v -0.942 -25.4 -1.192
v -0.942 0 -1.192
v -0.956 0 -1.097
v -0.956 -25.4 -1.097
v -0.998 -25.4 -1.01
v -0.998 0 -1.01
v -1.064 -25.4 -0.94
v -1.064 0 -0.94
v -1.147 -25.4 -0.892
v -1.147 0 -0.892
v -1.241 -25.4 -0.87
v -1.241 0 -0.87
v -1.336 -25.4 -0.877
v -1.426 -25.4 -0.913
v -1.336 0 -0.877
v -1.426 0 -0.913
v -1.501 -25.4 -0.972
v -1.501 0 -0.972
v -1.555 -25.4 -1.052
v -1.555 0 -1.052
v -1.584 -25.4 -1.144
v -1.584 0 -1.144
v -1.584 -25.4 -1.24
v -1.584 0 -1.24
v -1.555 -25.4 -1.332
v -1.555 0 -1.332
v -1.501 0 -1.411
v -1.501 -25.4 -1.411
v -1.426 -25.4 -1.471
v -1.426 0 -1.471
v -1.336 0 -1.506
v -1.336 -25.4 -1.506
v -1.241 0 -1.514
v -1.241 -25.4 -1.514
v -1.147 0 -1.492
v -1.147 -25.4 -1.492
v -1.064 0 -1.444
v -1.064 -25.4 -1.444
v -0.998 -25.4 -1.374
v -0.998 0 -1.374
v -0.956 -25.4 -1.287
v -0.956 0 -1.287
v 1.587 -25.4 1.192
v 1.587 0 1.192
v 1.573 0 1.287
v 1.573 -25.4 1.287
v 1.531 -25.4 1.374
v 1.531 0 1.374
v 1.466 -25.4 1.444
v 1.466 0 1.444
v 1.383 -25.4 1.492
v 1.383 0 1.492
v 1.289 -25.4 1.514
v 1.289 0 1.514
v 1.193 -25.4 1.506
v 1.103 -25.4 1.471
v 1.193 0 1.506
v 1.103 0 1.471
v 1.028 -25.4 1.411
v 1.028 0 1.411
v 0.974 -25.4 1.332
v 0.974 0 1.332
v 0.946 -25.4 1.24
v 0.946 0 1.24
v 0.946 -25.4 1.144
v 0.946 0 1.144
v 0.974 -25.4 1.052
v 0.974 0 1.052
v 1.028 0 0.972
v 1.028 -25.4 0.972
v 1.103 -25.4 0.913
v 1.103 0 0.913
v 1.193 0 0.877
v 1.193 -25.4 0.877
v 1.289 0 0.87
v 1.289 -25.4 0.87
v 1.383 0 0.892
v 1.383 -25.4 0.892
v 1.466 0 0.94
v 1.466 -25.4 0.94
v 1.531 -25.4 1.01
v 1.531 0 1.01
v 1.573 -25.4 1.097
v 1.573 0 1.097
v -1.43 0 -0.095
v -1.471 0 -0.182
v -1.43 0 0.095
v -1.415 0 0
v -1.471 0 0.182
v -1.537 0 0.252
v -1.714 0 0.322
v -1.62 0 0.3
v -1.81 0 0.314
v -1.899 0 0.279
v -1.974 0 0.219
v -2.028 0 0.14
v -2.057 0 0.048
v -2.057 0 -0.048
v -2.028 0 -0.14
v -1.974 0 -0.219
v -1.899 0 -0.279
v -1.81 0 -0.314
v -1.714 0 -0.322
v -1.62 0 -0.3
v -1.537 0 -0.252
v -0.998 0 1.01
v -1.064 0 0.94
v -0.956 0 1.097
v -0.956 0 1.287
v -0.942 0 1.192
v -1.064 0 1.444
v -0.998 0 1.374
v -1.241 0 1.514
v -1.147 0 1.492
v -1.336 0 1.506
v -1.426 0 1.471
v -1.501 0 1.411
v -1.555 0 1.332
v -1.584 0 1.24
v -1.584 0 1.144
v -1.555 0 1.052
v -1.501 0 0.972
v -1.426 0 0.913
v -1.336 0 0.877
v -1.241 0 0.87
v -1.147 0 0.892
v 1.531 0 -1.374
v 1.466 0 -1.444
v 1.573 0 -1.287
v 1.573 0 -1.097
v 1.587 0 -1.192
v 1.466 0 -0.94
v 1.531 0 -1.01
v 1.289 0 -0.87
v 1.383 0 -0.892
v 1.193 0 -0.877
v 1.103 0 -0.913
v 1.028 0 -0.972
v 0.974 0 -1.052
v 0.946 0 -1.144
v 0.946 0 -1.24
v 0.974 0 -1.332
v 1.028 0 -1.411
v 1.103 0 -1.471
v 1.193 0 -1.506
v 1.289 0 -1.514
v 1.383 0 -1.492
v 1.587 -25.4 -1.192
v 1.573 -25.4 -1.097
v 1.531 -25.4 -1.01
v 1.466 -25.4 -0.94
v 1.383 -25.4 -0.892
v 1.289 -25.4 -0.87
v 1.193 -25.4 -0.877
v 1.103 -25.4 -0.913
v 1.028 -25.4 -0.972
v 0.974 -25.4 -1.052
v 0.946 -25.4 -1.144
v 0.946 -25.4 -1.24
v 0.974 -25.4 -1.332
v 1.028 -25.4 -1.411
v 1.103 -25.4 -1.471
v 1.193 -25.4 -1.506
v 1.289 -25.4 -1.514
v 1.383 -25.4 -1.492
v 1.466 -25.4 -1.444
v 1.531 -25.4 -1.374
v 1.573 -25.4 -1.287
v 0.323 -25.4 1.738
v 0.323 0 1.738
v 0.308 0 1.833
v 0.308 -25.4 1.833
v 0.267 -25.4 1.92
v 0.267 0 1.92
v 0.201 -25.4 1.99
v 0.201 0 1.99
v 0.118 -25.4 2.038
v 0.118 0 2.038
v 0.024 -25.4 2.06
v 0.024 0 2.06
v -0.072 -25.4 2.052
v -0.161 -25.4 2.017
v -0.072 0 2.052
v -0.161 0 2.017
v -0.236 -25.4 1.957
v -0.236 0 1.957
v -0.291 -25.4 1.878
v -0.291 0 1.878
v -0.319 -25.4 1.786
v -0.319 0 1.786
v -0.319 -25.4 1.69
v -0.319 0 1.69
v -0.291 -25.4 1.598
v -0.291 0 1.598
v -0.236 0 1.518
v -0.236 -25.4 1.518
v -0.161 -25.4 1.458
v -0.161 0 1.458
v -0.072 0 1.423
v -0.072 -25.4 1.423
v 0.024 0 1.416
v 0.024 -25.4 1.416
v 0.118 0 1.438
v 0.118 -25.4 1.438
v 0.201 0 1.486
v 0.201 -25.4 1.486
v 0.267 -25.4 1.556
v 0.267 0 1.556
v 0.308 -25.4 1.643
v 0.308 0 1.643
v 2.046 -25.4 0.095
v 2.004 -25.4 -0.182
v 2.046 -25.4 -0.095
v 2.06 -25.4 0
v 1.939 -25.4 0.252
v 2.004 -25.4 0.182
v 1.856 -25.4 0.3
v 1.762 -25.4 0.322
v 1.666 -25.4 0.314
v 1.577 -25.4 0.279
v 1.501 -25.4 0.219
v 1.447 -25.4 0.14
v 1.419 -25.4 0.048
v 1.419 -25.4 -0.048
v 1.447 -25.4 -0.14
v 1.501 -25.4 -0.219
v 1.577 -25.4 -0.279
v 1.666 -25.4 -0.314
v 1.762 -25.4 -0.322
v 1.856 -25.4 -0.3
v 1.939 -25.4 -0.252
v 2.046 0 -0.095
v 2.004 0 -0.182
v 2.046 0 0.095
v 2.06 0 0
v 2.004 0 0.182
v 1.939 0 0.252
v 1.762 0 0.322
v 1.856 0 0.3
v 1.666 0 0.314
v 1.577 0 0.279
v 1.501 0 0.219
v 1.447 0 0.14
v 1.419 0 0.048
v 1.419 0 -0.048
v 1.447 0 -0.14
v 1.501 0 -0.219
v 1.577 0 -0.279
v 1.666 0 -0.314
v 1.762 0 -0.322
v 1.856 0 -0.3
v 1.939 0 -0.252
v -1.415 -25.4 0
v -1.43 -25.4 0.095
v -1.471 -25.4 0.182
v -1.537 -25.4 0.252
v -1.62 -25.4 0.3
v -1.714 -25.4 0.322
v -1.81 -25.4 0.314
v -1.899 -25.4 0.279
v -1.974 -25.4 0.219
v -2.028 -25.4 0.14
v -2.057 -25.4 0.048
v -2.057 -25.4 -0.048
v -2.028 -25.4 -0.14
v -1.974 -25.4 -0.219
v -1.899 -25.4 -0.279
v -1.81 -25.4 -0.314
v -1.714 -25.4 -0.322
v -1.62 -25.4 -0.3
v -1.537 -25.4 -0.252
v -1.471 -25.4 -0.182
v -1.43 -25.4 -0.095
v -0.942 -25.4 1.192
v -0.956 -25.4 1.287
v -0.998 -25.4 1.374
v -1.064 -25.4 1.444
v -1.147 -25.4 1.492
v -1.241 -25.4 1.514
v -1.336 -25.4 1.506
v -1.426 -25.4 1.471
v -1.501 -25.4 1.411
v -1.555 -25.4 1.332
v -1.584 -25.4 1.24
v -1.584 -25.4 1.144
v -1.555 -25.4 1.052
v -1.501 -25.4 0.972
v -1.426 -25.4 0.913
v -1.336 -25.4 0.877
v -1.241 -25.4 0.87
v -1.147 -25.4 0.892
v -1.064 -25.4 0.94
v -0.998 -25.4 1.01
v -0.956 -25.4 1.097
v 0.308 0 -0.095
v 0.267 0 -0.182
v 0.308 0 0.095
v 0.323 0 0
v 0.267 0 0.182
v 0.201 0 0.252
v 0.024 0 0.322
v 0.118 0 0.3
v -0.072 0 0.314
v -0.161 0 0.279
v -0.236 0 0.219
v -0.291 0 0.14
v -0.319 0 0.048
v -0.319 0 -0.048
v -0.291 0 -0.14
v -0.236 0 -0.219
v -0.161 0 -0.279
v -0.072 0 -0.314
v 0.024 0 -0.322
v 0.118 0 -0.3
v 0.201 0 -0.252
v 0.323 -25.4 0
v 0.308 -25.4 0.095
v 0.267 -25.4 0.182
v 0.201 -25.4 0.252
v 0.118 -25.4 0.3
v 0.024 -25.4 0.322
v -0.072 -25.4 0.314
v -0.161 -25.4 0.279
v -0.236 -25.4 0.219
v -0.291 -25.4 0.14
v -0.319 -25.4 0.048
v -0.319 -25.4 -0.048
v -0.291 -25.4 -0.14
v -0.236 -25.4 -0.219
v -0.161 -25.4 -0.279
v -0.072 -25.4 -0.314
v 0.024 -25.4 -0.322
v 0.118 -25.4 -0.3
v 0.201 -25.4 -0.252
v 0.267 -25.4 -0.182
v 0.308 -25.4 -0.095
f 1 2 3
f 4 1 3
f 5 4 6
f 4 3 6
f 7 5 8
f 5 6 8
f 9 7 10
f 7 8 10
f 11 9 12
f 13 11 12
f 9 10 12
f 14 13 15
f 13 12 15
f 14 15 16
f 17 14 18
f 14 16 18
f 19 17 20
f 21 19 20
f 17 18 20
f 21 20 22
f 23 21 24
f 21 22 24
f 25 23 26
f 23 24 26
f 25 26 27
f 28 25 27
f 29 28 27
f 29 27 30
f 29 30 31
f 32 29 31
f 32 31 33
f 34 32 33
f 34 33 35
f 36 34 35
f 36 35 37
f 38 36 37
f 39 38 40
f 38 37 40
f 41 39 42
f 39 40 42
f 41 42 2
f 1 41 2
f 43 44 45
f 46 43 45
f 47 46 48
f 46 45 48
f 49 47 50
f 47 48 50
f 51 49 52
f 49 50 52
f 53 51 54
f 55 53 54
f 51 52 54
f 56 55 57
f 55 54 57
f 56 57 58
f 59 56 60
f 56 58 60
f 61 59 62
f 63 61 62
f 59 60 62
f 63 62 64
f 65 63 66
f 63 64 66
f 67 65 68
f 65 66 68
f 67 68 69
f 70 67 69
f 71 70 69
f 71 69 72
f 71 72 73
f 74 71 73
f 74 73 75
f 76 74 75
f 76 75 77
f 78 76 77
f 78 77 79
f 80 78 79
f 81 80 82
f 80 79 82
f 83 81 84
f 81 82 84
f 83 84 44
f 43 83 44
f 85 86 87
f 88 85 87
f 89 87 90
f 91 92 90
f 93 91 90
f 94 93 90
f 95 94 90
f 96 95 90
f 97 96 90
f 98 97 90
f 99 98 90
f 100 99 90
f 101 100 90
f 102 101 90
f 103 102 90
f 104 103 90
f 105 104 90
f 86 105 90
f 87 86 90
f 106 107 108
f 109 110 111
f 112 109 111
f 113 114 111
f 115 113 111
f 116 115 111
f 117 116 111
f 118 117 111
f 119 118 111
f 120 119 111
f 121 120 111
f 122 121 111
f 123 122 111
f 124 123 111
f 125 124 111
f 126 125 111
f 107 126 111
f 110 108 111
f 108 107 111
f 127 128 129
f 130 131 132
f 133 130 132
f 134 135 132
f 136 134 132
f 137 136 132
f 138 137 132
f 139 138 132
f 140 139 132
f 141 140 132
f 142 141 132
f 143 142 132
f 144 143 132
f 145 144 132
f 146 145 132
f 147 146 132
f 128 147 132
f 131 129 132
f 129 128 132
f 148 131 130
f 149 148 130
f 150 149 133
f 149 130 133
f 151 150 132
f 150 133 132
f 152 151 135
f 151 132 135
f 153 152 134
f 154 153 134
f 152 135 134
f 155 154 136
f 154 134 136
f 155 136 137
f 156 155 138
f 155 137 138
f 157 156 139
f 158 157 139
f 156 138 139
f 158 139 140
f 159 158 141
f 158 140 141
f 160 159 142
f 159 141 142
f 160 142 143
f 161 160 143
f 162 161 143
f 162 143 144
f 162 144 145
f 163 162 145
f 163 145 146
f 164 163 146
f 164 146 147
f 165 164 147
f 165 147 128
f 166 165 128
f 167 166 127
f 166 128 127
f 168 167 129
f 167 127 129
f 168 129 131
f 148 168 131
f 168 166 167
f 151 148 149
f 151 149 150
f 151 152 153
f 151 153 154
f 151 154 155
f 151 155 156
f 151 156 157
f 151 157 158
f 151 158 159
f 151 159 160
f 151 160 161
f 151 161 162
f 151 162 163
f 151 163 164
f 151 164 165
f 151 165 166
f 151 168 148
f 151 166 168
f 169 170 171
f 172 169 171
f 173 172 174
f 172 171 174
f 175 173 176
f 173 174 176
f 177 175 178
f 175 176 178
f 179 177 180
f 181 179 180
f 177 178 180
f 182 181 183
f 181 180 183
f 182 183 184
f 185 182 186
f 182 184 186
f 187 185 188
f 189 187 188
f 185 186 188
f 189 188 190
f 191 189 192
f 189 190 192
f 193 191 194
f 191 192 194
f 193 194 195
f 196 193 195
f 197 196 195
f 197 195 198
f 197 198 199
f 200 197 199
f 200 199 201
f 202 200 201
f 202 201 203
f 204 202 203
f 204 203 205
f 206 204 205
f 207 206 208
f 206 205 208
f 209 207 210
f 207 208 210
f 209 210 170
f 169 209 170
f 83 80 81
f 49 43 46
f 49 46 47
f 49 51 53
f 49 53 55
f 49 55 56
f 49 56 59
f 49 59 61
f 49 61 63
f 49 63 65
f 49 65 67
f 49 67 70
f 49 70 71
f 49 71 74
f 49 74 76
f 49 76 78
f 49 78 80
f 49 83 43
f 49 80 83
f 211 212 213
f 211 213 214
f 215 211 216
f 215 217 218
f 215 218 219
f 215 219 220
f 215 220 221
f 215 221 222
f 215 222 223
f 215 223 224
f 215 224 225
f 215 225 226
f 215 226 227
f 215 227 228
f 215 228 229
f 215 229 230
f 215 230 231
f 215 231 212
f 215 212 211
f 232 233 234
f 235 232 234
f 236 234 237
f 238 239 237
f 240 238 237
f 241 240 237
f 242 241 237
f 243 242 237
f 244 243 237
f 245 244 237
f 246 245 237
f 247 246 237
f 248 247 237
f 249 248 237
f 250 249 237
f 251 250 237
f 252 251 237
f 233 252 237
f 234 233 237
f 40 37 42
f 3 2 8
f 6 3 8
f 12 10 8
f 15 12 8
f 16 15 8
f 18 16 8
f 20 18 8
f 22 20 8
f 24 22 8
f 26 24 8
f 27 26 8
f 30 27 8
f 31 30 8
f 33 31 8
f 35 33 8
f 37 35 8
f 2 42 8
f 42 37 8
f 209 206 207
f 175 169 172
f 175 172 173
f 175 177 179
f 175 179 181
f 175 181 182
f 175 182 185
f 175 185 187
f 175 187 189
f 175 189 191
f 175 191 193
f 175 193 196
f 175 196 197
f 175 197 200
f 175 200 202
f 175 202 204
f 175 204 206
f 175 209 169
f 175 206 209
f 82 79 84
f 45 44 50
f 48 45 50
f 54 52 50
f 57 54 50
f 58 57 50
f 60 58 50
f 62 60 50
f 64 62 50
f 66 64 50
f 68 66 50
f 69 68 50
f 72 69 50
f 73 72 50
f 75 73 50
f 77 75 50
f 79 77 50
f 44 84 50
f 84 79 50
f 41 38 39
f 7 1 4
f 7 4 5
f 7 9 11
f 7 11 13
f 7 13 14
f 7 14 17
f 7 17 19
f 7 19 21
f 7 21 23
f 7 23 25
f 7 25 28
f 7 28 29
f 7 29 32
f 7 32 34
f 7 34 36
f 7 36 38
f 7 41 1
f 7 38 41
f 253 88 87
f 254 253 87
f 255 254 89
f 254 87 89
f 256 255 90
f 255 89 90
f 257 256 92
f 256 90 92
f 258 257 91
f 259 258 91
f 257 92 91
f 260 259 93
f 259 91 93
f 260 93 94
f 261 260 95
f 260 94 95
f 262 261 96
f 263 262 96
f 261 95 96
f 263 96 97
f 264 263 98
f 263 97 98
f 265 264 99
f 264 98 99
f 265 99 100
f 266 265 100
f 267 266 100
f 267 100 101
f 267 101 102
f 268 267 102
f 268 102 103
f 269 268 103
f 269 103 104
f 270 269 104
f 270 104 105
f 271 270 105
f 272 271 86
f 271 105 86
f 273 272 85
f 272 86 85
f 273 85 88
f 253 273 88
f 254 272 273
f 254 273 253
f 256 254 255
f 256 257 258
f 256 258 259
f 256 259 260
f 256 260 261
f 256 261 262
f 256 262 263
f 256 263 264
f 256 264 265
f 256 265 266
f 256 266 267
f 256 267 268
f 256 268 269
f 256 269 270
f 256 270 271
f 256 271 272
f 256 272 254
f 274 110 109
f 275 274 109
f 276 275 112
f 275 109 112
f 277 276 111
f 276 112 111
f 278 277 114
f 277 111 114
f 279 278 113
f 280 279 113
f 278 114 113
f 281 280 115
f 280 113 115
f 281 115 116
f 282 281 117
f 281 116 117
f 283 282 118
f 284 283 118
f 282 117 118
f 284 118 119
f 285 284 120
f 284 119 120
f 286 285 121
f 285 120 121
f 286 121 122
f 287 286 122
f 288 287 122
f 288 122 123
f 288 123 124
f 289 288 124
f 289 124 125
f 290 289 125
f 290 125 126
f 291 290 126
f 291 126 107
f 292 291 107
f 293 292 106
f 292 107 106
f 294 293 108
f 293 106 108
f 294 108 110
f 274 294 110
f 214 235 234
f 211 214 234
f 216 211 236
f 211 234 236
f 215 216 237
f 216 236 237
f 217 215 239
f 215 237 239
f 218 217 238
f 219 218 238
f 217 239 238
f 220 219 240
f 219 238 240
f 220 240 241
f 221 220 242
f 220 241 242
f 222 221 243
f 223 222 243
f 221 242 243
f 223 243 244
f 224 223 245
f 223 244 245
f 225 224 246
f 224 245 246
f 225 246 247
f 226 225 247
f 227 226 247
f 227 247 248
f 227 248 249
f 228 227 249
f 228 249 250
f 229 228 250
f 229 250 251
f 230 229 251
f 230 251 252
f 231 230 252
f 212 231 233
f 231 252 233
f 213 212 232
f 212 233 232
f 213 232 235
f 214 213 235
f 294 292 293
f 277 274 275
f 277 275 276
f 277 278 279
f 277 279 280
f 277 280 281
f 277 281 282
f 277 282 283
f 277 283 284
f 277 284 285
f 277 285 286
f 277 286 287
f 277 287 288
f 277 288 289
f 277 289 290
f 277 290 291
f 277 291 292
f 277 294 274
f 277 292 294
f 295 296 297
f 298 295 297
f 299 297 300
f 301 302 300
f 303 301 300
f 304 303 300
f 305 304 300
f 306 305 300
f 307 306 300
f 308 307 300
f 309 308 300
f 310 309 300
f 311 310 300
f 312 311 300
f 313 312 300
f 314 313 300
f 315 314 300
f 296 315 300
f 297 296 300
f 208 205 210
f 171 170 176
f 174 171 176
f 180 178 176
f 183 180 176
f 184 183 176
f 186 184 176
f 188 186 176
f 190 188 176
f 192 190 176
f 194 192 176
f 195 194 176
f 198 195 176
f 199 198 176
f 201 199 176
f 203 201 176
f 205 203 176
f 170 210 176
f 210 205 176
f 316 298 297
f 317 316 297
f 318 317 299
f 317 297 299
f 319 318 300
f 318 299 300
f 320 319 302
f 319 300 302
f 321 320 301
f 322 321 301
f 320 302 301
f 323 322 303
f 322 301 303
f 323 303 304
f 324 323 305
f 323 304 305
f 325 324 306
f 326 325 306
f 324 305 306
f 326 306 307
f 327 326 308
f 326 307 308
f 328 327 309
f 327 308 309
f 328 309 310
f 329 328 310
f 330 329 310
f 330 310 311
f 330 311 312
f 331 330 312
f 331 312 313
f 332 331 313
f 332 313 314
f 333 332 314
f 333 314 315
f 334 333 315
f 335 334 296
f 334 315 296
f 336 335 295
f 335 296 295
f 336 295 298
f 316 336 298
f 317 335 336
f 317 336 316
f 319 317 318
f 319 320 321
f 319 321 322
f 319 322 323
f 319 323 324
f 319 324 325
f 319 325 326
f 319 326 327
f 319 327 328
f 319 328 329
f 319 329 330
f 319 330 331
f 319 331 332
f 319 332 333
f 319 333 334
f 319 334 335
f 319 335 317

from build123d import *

# Parameters (mm, degrees)
F0_R     = 0.32258
F1_DEPTH = 25.4


with BuildPart() as f1:
    # F0 (on Front) → F1 (new body)
    with BuildSketch(Plane.XZ):
        with Locations((1.737832, 0)):
            Circle(F0_R)
        with Locations((1.264694, -1.191893)):
            Circle(F0_R)
        with Locations((1.264694, 1.191893)):
            Circle(F0_R)
        Circle(F0_R)
        with Locations((-1.264694, -1.191893)):
            Circle(F0_R)
        with Locations((-1.737832, 0)):
            Circle(F0_R)
        with Locations((-1.264694, 1.191893)):
            Circle(F0_R)
        with Locations((0, 1.737832)):
            Circle(F0_R)
    extrude(amount=F1_DEPTH)


solid = f1.part
